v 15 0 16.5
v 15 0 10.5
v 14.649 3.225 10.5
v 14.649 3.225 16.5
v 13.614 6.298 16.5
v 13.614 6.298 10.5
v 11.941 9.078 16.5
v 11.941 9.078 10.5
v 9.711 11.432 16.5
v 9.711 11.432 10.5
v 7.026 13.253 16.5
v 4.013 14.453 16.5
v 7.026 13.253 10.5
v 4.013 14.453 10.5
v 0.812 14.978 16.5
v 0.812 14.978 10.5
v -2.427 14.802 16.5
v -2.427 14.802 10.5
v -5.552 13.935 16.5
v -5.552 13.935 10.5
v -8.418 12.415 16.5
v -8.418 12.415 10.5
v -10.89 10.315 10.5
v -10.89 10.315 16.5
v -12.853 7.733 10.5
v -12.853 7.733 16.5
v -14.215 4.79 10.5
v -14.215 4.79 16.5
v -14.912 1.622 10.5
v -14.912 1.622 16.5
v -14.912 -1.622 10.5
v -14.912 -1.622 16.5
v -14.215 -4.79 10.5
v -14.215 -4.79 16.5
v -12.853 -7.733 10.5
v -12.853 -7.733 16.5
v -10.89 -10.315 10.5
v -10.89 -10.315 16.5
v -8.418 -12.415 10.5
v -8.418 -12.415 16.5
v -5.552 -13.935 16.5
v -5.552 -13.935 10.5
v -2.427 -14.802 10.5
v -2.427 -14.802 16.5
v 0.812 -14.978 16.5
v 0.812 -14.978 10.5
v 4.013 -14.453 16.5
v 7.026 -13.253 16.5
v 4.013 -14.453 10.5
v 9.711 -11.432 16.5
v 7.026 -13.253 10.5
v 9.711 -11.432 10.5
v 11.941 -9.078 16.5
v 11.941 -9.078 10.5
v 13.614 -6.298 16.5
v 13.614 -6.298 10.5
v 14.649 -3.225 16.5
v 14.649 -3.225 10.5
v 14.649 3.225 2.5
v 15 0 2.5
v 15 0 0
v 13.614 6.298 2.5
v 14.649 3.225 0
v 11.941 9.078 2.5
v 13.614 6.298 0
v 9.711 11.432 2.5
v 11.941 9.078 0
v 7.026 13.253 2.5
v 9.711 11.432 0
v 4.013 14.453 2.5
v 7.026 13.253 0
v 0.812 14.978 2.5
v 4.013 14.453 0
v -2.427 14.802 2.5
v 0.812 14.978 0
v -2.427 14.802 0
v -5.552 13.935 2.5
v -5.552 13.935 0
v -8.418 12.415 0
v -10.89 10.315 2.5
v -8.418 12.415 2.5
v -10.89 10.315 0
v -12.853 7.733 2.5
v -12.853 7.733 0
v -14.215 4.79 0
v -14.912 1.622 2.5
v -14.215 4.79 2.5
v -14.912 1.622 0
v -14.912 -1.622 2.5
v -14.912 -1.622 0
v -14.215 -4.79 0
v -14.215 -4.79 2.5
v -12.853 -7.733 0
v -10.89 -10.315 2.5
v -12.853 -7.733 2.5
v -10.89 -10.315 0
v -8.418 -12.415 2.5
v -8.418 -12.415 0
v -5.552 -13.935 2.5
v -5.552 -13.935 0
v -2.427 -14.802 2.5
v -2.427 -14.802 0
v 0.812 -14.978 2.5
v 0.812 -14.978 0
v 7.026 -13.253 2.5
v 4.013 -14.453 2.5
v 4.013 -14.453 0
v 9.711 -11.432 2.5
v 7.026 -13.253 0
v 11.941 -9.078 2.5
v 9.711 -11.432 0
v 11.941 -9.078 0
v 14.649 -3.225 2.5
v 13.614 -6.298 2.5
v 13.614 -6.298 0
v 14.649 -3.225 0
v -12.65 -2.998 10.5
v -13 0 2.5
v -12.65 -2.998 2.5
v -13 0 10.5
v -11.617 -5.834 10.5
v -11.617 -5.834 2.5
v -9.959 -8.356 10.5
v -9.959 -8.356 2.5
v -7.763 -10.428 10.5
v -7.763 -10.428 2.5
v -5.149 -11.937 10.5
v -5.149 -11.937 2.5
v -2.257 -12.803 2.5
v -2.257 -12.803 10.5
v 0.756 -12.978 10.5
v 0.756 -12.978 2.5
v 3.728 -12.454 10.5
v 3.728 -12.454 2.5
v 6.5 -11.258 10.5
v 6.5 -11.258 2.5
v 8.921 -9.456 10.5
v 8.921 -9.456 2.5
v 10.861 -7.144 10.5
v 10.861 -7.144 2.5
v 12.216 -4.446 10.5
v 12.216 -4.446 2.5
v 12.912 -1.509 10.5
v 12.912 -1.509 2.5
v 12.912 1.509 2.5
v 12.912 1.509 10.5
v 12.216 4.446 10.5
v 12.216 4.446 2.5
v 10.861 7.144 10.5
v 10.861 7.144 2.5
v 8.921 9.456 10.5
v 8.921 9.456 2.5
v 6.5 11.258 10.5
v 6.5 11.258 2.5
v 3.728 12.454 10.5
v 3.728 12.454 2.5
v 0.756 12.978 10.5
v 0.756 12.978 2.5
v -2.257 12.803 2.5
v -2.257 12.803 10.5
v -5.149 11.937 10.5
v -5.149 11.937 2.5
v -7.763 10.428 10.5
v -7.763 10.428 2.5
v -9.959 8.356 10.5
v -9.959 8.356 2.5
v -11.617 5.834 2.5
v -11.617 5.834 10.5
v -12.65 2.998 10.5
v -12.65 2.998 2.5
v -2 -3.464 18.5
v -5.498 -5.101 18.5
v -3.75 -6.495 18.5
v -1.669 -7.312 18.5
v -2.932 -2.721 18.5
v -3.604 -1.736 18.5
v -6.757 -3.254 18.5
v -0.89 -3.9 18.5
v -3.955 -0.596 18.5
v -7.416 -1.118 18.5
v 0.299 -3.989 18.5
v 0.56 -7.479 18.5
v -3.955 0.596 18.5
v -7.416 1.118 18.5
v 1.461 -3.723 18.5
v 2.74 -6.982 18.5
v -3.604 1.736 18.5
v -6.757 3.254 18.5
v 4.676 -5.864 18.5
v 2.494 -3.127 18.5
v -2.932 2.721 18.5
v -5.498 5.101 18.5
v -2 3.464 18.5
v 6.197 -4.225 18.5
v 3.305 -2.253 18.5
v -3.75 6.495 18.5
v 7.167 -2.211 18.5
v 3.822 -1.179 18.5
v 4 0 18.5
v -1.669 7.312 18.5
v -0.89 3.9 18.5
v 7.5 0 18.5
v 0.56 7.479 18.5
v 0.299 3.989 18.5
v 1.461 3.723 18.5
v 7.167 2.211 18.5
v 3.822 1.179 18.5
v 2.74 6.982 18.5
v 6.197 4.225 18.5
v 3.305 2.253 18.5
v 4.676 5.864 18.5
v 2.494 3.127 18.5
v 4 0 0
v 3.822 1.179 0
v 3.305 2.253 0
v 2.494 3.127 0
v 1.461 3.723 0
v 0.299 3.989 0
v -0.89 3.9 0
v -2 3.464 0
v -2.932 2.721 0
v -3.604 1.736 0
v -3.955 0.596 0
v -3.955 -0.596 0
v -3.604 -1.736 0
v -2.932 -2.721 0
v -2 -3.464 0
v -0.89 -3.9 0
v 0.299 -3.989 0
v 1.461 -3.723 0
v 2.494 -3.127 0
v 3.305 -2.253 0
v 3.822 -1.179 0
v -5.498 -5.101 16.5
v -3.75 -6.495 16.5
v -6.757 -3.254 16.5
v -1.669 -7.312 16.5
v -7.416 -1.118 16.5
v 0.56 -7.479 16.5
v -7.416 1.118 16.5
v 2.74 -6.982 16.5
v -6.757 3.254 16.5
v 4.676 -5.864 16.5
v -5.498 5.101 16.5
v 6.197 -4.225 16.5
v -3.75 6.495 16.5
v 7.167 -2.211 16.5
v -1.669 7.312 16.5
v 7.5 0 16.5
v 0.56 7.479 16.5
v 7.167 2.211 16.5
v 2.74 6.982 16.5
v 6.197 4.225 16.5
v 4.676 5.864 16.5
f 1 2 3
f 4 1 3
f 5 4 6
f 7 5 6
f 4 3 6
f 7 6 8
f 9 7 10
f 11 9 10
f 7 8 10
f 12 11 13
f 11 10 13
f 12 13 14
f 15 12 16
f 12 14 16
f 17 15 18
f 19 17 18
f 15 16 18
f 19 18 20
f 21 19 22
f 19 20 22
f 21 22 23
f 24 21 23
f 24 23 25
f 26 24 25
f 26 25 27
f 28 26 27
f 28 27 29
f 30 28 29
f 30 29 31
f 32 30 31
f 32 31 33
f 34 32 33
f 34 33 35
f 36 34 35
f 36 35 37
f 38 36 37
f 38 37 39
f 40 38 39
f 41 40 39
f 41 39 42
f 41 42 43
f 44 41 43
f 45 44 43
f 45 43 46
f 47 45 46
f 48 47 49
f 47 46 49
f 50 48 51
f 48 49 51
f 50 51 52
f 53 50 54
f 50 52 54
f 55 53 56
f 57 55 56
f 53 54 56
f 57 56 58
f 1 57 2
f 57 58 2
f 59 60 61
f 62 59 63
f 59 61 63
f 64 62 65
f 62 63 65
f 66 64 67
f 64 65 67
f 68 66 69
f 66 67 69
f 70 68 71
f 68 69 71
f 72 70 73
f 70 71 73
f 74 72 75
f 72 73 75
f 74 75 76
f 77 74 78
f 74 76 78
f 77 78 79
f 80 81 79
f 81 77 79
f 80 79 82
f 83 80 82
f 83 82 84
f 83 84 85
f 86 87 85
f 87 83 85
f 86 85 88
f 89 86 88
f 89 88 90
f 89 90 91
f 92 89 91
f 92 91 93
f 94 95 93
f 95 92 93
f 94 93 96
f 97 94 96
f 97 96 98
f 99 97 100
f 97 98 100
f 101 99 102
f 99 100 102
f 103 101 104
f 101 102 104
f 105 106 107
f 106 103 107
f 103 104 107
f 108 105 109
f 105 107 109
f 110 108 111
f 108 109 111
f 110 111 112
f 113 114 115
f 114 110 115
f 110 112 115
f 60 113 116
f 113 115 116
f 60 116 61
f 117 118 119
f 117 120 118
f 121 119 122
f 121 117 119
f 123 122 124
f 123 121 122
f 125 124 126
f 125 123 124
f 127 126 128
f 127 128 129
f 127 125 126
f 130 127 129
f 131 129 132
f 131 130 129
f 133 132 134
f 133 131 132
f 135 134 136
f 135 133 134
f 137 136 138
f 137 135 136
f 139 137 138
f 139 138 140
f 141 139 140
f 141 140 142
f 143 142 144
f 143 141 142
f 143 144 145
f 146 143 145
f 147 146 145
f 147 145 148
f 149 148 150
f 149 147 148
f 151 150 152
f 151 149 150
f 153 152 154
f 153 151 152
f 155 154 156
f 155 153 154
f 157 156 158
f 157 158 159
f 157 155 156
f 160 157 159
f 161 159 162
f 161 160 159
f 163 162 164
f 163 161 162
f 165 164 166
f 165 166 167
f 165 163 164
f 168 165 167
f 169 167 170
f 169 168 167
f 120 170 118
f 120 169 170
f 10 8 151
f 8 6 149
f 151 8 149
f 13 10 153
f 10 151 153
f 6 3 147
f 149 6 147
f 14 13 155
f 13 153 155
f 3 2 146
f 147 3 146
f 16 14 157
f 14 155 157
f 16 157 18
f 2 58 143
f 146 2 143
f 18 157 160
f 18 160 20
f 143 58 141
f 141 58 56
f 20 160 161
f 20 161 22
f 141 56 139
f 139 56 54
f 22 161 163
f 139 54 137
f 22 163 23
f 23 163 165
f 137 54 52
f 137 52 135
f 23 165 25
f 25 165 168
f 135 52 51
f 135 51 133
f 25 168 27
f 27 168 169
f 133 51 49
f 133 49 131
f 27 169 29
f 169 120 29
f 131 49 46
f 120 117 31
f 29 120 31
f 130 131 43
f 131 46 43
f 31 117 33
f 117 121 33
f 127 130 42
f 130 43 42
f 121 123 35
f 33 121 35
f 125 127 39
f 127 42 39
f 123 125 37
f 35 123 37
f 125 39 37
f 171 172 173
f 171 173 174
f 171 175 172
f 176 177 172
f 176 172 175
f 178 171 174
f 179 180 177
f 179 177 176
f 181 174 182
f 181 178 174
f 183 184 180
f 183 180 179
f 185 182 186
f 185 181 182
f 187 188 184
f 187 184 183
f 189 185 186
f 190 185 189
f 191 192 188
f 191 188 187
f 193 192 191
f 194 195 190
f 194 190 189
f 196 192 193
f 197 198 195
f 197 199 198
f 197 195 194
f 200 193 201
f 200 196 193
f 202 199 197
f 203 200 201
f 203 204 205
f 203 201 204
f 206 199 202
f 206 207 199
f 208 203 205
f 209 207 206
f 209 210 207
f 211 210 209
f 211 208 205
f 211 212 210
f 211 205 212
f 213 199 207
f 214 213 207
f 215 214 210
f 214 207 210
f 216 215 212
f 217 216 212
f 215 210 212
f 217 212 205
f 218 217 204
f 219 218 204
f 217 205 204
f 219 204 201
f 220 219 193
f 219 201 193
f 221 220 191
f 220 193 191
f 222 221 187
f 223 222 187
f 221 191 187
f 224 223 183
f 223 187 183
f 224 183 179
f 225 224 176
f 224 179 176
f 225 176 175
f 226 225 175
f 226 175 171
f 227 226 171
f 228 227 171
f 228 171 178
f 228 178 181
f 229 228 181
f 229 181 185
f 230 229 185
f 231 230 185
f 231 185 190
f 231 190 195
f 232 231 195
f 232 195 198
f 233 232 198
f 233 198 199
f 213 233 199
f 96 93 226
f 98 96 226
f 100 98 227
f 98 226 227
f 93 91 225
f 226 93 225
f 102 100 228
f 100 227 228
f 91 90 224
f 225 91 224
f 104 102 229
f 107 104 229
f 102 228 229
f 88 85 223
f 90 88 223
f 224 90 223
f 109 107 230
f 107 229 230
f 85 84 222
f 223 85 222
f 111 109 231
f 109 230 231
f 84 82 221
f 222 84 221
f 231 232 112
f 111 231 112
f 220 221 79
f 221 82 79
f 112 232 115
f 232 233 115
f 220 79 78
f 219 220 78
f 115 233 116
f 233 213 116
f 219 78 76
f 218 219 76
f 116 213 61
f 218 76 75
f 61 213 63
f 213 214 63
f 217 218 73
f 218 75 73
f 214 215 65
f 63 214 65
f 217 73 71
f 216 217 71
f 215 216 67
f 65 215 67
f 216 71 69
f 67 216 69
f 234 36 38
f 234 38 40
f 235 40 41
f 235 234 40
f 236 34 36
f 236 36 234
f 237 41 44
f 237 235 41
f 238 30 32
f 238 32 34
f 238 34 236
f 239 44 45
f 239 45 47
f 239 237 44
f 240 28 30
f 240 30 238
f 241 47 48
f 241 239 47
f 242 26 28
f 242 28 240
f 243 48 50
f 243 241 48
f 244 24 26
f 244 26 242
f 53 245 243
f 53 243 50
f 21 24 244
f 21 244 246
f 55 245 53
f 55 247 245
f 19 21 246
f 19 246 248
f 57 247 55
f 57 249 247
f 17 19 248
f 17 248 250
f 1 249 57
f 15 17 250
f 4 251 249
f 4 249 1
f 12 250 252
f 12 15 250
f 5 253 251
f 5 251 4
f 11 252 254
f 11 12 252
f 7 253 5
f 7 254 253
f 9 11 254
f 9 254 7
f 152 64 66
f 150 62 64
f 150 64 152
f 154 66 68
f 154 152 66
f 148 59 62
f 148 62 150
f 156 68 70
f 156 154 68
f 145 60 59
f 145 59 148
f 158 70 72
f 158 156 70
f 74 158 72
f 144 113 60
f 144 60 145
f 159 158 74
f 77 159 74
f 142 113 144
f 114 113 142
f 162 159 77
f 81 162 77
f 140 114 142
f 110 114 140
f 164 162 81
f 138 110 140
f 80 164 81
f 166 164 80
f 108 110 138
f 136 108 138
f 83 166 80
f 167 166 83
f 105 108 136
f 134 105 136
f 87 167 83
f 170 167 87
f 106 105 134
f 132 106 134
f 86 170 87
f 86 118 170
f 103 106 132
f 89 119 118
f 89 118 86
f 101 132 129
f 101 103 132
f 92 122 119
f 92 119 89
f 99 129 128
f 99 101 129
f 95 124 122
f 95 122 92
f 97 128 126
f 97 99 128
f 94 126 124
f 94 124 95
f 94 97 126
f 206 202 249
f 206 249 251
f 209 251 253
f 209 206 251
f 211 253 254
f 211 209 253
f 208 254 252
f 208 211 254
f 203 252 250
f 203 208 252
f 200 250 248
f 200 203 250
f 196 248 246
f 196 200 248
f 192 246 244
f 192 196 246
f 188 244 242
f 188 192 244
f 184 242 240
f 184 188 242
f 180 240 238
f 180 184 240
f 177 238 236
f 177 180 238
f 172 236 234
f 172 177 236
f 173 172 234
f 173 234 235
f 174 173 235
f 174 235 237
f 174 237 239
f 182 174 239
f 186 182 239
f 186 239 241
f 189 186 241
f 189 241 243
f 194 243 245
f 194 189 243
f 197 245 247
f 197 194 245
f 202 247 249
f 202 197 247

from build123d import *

# Parameters (mm, degrees)
SKIZZE1_R                       = 15
AUFSATZ_LINEAR_AUSTRAGEN1_DEPTH = 16.5
SCHNITT_LINEAR_AUSTRAGEN1_REACH = 28.875
SKIZZE2_R                       = 4
AUFSATZ_LINEAR_START            = 2
SKIZZE4_R                       = 7.5
SKIZZE4_R_2                     = 4
AUFSATZ_LINEAR_AUSTRAGEN2_DEPTH = 2
SKIZZE3_W                       = 2
SKIZZE3_H                       = 8


with BuildPart() as part:
    # Skizze1 → Aufsatz-Linear austragen1 (new body)
    with BuildSketch(Plane(origin=(0, 0, 0), x_dir=(0, 1, 0), z_dir=(0, 0, 1))):
        with Locations(Location((0, 0, 0), (0, 0, 270))):
            Circle(SKIZZE1_R)
    extrude(amount=AUFSATZ_LINEAR_AUSTRAGEN1_DEPTH)

    # Skizze2 → Schnitt-Linear austragen1 (cut, up to next)
    with BuildSketch(Plane.XY.offset(16.5), mode=Mode.PRIVATE) as schnitt_linear_austragen1_sk1:
        Circle(SKIZZE2_R)
    schnitt_linear_austragen1_tool1 = extrude(schnitt_linear_austragen1_sk1.sketch, amount=-SCHNITT_LINEAR_AUSTRAGEN1_REACH, mode=Mode.PRIVATE) & part.part
    add(schnitt_linear_austragen1_tool1.solids().sort_by_distance((0, 0, 16.5))[0], mode=Mode.SUBTRACT)

    # Skizze4 → Aufsatz-Linear austragen2 (add)
    with BuildSketch(Plane.XY.offset(16.5).offset(AUFSATZ_LINEAR_START)):
        Circle(SKIZZE4_R)
        Circle(SKIZZE4_R_2, mode=Mode.SUBTRACT)
    extrude(amount=-AUFSATZ_LINEAR_AUSTRAGEN2_DEPTH)

    # Skizze3 → Schnitt-Rotation1 (revolve, cut)
    with BuildSketch(Plane(origin=(0, 0, 0), x_dir=(-1, 0, 0), z_dir=(0, 1, 0)), mode=Mode.PRIVATE) as schnitt_rotation1_sk:
        with Locations((-14, 6.5)):
            Rectangle(SKIZZE3_W, SKIZZE3_H)
    revolve(schnitt_rotation1_sk.sketch.rotate(Axis((0, 0, 0), (0, 0, 1)), 180), axis=Axis((0, 0, 0), (0, 0, 1)), mode=Mode.SUBTRACT)


solid = part.part
